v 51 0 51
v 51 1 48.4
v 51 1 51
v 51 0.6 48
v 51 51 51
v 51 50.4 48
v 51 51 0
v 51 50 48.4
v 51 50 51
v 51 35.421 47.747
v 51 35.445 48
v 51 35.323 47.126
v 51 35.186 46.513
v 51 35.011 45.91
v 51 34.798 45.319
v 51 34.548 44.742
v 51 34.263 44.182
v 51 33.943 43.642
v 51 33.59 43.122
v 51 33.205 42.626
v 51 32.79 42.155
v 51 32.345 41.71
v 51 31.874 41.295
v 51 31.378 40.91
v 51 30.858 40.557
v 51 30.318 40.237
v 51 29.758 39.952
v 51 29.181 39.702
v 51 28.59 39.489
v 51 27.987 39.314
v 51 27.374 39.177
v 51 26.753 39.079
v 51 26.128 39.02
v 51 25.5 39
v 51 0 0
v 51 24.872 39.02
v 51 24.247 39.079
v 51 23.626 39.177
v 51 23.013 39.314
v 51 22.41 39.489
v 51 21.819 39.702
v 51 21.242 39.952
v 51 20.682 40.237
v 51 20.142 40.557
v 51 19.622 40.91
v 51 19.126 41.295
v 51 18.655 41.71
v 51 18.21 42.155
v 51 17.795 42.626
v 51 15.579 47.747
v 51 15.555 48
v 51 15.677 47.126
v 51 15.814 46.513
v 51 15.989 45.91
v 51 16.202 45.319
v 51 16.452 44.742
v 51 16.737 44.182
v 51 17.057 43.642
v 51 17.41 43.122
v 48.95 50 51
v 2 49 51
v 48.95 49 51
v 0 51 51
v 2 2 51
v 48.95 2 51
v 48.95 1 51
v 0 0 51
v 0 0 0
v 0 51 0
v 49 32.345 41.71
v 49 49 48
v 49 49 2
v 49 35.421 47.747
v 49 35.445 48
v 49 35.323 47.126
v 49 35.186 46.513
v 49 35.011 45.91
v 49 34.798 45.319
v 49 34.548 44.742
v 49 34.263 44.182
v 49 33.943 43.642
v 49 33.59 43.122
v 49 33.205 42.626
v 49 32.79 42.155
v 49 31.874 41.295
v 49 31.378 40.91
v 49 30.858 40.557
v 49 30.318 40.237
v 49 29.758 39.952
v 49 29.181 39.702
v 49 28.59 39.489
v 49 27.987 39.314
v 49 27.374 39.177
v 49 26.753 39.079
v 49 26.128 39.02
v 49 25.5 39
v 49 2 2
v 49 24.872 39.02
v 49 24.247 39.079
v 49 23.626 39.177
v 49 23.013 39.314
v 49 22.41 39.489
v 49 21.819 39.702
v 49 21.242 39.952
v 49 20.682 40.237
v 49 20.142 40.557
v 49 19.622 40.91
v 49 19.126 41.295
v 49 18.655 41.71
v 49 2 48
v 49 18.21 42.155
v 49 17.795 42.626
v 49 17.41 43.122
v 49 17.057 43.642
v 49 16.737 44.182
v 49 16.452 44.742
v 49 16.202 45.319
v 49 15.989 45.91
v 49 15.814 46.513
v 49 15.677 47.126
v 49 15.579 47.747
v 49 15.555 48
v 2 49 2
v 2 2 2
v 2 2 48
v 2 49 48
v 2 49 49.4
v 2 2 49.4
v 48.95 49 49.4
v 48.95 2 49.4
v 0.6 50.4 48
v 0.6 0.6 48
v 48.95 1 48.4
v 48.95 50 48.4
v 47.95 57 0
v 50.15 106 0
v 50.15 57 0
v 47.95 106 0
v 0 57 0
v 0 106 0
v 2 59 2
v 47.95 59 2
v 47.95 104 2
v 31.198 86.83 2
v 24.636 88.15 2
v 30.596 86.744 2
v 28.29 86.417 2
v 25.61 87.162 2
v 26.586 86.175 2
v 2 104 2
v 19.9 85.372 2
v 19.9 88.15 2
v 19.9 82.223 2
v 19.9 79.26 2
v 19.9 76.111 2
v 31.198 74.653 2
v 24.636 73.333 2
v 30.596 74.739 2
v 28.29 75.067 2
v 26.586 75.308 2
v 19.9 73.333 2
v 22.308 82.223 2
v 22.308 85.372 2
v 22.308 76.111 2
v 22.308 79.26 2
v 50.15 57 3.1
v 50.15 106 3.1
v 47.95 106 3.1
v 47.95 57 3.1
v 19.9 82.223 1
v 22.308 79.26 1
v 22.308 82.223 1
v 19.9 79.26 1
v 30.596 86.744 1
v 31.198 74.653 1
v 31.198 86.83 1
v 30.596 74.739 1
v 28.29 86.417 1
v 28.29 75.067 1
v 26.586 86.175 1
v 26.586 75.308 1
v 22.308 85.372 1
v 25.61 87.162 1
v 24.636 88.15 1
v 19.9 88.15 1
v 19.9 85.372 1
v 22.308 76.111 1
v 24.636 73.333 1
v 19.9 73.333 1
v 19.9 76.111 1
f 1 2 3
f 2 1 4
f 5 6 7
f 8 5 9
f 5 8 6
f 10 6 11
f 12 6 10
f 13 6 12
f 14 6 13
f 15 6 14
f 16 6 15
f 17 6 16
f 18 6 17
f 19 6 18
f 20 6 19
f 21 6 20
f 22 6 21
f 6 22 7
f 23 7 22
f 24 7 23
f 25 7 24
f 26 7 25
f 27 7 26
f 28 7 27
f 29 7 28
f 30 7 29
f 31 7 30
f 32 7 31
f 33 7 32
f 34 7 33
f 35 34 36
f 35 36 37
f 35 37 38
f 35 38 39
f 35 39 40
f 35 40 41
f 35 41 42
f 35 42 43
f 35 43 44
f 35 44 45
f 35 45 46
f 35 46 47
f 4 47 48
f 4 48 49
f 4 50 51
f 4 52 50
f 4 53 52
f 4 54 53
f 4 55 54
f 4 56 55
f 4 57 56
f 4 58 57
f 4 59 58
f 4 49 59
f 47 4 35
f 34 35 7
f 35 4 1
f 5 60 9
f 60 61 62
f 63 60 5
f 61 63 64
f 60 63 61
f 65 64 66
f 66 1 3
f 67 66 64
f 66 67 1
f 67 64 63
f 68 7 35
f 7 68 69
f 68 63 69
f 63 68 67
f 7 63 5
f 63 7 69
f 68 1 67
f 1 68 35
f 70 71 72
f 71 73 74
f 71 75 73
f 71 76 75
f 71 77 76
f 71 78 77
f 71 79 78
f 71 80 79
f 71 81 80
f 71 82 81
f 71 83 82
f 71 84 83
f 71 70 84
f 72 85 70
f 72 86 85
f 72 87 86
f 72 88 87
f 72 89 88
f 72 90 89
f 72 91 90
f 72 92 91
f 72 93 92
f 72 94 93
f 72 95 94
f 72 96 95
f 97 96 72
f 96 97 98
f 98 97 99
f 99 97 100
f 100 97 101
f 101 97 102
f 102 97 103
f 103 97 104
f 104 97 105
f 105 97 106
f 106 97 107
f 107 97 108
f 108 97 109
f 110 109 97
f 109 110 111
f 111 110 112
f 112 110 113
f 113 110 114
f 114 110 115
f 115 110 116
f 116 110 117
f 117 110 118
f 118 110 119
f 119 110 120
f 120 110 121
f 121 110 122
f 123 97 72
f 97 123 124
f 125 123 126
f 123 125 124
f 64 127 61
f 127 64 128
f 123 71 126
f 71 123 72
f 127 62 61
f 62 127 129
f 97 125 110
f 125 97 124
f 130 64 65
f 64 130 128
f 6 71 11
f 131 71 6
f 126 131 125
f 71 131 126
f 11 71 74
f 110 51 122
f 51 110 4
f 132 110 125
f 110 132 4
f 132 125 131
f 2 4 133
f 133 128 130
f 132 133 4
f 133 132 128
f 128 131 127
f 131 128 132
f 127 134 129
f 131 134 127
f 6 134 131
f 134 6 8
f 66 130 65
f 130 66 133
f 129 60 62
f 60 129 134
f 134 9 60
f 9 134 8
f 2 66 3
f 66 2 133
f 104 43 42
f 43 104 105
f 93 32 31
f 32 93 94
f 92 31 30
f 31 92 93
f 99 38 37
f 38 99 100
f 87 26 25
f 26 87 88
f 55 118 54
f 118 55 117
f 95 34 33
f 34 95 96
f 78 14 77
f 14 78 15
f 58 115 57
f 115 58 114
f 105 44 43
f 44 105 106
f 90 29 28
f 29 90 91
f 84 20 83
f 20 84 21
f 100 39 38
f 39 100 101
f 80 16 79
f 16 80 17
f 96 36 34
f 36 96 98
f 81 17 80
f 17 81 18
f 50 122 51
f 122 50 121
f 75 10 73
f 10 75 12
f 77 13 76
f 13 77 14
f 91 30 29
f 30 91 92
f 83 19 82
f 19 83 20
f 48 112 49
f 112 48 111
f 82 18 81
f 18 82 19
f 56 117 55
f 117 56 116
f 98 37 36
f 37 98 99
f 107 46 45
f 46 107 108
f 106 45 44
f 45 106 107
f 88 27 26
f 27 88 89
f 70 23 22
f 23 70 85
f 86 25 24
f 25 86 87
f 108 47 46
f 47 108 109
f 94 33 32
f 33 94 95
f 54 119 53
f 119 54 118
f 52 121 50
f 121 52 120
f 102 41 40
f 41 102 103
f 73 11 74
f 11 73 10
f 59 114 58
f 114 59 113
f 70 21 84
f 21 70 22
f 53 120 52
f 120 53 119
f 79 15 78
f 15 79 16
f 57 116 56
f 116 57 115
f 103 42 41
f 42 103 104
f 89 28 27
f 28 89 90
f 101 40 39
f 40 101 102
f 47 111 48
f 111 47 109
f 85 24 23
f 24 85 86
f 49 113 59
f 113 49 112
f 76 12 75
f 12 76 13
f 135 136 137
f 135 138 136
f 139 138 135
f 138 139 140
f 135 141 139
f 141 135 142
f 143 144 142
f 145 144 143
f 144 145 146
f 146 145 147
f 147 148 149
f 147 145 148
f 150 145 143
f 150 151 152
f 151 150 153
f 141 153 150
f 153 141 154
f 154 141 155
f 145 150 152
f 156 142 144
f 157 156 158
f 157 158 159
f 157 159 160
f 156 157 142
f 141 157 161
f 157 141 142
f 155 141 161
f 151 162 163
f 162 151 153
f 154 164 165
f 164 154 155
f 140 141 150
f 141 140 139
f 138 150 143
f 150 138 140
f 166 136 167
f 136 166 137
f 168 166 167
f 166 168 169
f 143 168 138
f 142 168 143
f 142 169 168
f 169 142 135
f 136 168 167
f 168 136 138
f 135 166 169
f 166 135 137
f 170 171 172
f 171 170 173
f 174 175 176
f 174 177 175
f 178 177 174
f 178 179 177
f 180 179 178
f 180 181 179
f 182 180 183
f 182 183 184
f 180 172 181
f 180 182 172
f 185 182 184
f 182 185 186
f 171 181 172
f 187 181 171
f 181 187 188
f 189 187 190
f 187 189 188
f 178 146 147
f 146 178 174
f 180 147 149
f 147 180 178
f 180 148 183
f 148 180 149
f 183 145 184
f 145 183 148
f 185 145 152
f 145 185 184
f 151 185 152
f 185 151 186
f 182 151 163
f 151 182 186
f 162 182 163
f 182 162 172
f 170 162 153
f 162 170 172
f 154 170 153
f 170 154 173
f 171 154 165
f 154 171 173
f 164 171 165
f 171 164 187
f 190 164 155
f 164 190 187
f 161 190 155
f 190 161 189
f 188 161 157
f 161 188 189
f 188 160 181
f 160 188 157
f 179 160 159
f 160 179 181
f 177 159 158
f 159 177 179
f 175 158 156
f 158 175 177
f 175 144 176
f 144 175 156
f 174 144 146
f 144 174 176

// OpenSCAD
// file: carcassonne_box.scad
/**
 * @file carcassonne_box.scad
 * @author Conlan Wesson
 * Template for Carcossonne boxes.
 * @copyright Creative Commons Attribution-NonCommercial-ShareAlike 4.0
 */

mm = 1;
cm = 10*mm;

width = 47*mm;
thick = 2.5*mm;
wall = 2*mm;

/**
 * Lid for box.
 * @param count Number of cards.
 * @param columns Number of columns.
 * @param icon Path to icon DXF file.
 * @param rot Icon rotation in degrees.
 * @param mult Icon scale.
 * @param xoff X-offset of icon from center.
 * @param yoff Y-offset of icon from center.
 */
module carcassonne_lid(count, columns=1, icon=false, rot=0, mult=1, xoff=0, yoff=0, g=0){
	length = (thick * count) + ((width/2) - ((thick * count) % (width/2)));
	w = length+(1.5*wall)+.1;
	l = (width*columns)+wall;
	h = wall;
	d = 2;

	CubePoints = [
		[ 0-g, 0-g,   0 ],  //0
		[ w+g, 0-g,   0 ],  //1
		[ w+g, l+g,   0 ],  //2
		[ 0-g, l+g,   0 ],  //3
		[   d,   d, h+g ],  //4
		[   w,   d, h+g ],  //5
		[   w, l-d, h+g ],  //6
		[   d, l-d, h+g ]   //7
	];
	
	CubeFaces = [
		[0,1,2,3],  // bottom
		[4,5,1,0],  // front
		[7,6,5,4],  // top
		[5,6,2,1],  // right
		[6,7,3,2],  // back
		[7,4,0,3]   // left
	];
	
	
	difference(){
		union(){
			polyhedron( CubePoints, CubeFaces );
			translate([w-wall-.15,0,0]) cube([wall+.2,l, (1.5*wall)+.1]);
		}
		if(icon){
			translate([w/2+xoff,l/3+yoff,h-(wall/2)]){
				linear_extrude(height=(wall)+.1){
					rotate(rot) scale(mult) import(icon);
				}
			}
		}
	}
}

/**
 * Carcassonne card box.
 * @param count Number of cards.
 * @param dividers Array of divider positions.
 * @param columns Number of columns.
 */
module carcassonne_box(count, dividers=[], columns=1){
	length = (thick * count) + ((width/2) - ((thick * count) % (width/2)));
	difference(){
		union(){
			difference(){
				// Outer walls
				cube([length+(2*wall), (width*columns)+(2*wall), width+(2*wall)]);
				// Cavity
				translate([wall, wall, wall]){
					cube([length, width*columns, (width+wall)+.1]);
				}
			}
			// Dividers
			for(col = [0:columns-1]){
				for(div = dividers[col]){
					translate([(div*(width/2))+(wall/2), width*col+wall, 0]) cube([wall/2, width, width-(2*wall)]);
				}
				if(col > 0){
					translate([0, width*col+(wall/2), 0]) cube([length+(2*wall), wall/2, width-(2*wall)]);
				}
			}
		}
		union(){
			// Notch
			for(col = [0:columns-1]){
				translate([wall, wall+(width*col), wall]){
					translate([0, width/2, width])
					rotate([0, 90, 0]){
						cylinder(r=10, h=length+(2*wall), $fn=100);
					}
				}
			}
			// Track
			translate([wall/2,wall/2,width+wall/2]) carcassonne_lid(count, columns, g=0.4);
		}
	}
}
// main file
/**
 * @file watchtowers.scad
 * @author Conlan Wesson
 * The Watchtowers Carcossonne box.
 * @copyright Creative Commons Attribution-NonCommercial-ShareAlike 4.0
 */

include <carcassonne_box.scad>

count = 12;
dividers = [[]];
columns = 1;

carcassonne_box(count, dividers, columns);
translate([0,width*columns+10,0]) carcassonne_lid(count, columns, icon="watchtowers.dxf", rot=90, mult=0.7, xoff=8, yoff=0);
